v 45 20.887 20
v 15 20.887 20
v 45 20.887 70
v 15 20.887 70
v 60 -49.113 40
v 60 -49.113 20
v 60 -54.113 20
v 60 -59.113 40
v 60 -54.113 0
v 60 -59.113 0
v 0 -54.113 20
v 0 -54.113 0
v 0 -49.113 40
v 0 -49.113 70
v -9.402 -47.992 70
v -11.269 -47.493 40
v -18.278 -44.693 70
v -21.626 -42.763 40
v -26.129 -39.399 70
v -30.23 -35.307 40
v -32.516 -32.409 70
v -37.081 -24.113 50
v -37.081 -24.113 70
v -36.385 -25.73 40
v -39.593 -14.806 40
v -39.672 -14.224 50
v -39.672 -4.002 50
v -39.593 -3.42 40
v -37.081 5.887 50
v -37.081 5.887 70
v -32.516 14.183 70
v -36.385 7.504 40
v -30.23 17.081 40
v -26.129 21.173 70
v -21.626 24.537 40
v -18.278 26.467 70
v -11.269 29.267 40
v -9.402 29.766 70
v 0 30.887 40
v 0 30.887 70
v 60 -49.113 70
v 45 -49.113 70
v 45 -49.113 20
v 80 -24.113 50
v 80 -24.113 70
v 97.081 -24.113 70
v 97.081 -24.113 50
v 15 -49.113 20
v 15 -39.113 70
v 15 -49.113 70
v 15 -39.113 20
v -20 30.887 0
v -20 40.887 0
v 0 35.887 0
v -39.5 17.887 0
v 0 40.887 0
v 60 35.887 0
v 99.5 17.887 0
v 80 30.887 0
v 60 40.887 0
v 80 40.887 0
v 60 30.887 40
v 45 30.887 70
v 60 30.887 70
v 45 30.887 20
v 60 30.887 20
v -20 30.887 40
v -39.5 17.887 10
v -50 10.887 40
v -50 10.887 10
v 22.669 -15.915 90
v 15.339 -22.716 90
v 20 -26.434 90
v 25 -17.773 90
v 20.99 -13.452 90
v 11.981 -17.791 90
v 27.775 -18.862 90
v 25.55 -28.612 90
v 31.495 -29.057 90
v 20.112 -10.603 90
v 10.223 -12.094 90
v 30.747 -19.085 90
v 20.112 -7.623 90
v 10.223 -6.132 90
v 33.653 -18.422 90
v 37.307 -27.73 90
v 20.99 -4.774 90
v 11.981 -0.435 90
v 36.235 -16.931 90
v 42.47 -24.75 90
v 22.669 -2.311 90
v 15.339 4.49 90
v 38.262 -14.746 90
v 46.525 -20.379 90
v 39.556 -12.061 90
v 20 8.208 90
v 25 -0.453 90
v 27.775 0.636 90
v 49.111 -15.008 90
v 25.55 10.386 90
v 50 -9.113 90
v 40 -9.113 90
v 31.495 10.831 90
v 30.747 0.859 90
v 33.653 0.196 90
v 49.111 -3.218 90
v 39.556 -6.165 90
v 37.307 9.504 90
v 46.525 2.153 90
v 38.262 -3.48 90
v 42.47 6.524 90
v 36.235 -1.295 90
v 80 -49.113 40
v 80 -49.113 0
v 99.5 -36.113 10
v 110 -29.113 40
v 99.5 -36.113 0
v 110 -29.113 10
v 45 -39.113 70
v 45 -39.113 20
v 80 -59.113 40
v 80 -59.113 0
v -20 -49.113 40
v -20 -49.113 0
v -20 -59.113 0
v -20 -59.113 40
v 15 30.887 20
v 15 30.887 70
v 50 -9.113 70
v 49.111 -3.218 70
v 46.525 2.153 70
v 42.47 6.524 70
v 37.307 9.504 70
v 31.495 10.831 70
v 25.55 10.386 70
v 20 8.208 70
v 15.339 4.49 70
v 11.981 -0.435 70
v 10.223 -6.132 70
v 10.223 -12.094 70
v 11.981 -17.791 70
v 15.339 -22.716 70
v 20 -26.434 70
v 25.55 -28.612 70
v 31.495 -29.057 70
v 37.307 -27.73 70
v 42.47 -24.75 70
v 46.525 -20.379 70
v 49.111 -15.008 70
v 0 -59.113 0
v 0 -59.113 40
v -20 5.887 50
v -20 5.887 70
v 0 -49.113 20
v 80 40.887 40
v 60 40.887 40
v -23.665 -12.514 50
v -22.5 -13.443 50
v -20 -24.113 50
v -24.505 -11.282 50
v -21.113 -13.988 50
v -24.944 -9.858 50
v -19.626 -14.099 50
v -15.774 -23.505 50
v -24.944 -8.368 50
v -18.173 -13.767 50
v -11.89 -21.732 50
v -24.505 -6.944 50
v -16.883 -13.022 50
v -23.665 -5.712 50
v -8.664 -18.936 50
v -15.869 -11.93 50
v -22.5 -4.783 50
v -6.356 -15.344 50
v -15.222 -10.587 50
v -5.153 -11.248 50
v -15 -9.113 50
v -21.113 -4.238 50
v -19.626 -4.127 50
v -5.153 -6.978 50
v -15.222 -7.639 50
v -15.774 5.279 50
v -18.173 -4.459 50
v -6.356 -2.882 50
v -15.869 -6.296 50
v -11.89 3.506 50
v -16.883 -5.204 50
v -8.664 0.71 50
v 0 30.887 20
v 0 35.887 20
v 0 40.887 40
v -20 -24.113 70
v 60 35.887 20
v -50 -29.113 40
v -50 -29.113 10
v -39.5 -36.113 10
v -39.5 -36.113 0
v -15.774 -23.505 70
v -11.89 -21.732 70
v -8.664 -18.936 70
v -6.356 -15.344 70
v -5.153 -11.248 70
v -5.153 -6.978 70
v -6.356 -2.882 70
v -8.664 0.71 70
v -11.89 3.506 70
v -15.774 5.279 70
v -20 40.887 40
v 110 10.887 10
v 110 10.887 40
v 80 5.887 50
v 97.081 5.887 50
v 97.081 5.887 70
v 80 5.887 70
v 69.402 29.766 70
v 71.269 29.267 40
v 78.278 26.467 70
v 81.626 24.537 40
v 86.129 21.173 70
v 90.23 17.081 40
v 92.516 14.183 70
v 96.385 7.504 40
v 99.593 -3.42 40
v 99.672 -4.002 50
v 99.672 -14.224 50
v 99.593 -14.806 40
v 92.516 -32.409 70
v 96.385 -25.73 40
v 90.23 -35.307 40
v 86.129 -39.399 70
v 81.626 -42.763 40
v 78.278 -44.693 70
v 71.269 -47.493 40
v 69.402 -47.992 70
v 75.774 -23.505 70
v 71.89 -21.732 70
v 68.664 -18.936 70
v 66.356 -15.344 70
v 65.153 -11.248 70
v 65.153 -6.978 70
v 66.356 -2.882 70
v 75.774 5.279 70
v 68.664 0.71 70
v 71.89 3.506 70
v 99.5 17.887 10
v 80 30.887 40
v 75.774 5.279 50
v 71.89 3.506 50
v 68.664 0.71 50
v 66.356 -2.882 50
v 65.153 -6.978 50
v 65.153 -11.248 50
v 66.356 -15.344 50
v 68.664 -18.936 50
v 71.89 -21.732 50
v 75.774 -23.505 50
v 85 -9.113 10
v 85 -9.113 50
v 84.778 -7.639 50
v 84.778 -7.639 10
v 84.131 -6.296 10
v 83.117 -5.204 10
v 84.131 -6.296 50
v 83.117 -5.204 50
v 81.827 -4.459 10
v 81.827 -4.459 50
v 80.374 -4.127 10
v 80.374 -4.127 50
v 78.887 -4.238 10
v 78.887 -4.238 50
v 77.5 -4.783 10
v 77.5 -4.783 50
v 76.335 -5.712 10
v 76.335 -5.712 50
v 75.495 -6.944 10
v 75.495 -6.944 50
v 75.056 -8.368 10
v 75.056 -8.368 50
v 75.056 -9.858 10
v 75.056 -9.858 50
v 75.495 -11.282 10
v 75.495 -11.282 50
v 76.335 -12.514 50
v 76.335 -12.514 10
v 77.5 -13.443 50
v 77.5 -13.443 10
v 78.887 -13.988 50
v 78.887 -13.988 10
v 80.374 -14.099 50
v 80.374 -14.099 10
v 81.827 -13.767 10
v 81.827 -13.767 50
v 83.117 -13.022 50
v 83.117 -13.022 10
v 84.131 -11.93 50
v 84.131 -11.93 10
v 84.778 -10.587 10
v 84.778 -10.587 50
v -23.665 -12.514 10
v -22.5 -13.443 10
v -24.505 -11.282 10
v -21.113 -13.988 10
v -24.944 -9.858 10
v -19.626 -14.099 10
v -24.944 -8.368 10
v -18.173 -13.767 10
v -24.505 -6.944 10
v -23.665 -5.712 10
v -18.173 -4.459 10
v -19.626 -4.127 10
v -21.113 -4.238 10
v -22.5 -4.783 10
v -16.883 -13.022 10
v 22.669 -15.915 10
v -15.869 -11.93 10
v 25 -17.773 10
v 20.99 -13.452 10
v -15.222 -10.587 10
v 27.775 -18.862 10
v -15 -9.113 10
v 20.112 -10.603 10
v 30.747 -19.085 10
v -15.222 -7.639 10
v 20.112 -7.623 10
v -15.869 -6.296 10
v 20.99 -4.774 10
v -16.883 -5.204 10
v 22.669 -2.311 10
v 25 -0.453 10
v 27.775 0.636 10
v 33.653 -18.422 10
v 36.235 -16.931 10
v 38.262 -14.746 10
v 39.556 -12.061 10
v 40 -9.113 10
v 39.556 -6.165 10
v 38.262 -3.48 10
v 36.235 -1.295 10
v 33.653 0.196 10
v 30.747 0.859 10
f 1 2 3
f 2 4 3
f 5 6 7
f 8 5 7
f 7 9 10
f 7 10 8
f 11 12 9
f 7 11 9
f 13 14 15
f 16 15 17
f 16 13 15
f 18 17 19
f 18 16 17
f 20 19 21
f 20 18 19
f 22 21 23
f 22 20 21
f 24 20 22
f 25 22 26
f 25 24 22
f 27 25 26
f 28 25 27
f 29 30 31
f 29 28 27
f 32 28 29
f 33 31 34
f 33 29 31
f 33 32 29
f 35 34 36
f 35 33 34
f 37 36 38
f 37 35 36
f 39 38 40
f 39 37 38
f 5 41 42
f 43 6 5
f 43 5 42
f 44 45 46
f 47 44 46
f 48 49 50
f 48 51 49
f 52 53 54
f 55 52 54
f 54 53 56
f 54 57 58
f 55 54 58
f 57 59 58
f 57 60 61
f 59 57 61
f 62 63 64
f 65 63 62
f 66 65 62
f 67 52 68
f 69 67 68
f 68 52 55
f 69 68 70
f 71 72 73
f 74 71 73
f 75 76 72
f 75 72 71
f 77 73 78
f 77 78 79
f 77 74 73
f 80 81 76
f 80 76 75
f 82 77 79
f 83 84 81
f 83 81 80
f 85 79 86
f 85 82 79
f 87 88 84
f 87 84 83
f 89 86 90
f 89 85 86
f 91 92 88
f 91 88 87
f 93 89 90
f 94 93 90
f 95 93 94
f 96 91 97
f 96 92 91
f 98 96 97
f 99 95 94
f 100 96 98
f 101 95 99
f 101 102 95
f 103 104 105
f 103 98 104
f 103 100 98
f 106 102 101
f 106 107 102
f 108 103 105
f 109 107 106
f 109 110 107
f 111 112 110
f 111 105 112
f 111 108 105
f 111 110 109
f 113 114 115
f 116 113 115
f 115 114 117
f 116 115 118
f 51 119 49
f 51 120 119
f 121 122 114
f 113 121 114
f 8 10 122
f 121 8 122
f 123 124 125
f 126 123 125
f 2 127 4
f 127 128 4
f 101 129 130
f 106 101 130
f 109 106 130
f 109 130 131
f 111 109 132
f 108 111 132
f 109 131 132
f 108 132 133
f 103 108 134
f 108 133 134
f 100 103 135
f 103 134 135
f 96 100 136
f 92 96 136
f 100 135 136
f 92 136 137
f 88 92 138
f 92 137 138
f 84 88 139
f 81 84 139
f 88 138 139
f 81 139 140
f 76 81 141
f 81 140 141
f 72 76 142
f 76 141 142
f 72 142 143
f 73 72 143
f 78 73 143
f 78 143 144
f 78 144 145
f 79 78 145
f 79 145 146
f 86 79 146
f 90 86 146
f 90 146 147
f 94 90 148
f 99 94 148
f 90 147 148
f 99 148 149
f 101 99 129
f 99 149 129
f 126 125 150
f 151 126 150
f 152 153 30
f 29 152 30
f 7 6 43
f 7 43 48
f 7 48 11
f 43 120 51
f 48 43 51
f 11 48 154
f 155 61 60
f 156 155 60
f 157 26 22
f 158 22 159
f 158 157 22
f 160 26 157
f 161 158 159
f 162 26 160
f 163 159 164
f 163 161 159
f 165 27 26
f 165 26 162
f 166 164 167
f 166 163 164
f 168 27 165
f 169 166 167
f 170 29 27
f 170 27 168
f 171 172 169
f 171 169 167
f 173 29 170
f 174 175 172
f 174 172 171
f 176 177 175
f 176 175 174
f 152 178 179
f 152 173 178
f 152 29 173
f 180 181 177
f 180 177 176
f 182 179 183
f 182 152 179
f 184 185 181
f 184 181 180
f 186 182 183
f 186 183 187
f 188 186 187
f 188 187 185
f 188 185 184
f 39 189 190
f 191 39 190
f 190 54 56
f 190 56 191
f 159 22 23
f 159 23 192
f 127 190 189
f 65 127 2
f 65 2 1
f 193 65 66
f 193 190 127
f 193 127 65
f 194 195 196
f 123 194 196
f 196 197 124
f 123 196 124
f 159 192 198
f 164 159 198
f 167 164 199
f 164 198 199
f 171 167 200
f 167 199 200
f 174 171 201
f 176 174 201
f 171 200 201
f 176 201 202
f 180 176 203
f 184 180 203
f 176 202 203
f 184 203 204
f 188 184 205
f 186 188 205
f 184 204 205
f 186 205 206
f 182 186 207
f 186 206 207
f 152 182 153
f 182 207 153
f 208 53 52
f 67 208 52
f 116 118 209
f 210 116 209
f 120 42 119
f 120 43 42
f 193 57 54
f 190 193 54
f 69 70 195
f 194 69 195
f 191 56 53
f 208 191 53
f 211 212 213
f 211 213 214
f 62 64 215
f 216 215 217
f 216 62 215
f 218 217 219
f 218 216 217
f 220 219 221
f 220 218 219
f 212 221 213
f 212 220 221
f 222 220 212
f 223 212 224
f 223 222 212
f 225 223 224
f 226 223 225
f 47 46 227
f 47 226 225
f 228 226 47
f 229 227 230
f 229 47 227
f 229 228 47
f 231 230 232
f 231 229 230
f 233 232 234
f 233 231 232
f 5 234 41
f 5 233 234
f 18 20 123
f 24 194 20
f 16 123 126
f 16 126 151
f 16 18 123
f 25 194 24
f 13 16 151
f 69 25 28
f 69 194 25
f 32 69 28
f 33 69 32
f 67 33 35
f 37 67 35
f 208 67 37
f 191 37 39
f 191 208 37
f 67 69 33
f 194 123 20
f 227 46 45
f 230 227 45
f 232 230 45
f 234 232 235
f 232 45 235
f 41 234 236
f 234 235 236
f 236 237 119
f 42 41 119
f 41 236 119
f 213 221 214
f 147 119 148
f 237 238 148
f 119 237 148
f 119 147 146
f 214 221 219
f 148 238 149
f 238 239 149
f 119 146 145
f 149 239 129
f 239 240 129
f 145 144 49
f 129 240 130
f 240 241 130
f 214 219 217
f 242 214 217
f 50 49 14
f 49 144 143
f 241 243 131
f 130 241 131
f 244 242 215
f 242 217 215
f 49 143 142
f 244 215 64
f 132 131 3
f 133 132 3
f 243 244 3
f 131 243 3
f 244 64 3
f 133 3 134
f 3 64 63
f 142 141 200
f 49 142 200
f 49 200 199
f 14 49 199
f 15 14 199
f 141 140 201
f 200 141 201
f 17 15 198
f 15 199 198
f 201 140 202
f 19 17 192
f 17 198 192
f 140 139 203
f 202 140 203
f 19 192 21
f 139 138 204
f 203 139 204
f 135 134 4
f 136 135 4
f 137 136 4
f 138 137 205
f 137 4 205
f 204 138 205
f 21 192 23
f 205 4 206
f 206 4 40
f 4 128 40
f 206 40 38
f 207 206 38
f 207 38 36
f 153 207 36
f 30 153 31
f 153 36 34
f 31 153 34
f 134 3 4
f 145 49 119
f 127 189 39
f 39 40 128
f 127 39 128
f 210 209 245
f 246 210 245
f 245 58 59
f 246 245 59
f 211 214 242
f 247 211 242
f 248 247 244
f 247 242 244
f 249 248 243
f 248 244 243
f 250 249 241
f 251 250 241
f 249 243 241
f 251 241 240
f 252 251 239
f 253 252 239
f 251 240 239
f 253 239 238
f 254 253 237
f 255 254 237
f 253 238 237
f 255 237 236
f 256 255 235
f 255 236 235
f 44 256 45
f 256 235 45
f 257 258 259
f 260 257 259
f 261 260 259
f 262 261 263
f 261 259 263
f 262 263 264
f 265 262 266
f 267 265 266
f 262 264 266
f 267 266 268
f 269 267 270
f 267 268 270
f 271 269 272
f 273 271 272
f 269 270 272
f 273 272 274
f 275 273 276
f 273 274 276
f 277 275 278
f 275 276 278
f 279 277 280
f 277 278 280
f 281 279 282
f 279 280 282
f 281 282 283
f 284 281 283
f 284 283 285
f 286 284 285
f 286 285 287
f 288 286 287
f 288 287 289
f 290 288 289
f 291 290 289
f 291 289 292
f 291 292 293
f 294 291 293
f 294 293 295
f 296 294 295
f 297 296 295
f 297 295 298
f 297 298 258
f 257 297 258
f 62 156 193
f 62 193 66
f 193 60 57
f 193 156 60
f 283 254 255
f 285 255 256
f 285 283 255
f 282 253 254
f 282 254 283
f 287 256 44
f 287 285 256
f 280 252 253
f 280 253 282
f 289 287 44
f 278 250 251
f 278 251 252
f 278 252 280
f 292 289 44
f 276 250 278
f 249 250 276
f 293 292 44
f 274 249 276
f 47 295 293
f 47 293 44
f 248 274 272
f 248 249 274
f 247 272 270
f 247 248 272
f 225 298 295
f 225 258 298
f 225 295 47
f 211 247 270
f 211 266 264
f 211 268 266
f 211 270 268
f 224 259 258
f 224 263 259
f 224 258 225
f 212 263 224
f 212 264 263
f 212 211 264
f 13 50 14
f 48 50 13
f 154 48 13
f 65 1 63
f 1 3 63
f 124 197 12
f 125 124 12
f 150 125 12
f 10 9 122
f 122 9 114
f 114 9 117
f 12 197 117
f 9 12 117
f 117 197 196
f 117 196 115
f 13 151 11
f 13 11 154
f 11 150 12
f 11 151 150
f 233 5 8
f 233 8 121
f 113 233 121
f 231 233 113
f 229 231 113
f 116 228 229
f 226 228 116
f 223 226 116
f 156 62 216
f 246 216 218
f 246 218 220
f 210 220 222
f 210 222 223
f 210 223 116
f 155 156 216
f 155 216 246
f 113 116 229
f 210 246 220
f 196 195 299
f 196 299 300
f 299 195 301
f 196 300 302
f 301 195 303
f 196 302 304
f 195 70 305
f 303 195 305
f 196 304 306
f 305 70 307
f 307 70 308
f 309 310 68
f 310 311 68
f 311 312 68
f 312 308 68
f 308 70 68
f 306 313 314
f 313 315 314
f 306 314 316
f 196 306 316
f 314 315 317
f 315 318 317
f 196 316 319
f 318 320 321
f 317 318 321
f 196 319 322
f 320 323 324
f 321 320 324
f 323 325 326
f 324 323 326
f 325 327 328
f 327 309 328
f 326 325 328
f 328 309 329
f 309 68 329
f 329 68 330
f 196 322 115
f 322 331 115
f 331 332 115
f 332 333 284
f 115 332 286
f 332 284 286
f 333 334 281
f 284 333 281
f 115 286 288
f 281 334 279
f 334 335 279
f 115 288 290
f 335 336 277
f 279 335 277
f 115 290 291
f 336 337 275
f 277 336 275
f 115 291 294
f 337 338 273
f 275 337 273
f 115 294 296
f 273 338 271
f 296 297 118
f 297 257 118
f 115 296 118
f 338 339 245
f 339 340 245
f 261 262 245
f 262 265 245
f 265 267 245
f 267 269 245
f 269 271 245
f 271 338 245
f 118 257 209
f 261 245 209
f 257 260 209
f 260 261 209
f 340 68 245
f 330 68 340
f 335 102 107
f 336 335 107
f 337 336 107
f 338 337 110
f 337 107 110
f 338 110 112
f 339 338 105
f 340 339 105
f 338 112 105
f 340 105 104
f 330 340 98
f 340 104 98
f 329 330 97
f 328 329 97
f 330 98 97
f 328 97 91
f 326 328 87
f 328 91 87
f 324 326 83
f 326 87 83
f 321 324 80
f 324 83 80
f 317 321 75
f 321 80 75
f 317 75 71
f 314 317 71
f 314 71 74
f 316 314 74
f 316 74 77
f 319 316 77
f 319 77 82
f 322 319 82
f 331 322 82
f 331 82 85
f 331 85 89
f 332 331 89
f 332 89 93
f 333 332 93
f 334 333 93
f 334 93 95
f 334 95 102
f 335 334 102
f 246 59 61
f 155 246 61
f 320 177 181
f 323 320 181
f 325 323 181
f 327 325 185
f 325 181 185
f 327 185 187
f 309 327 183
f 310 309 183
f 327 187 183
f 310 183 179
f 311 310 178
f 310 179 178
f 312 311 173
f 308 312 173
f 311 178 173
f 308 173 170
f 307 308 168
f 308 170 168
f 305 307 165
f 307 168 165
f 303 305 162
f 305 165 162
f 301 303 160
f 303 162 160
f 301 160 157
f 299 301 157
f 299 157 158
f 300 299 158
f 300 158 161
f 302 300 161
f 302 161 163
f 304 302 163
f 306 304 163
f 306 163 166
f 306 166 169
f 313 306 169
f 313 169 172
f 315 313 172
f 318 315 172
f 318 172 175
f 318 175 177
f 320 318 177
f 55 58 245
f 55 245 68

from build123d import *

# Parameters (mm, degrees)
BOSS_EXTRUDE1_DEPTH = 40
BOSS_EXTRUDE2_DEPTH = 30
SKETCH3_R           = 20
BOSS_EXTRUDE3_DEPTH = 20
SKETCH4_R           = 10
CUT_EXTRUDE1_DEPTH  = 185
SKETCH5_R           = 5
CUT_EXTRUDE2_DEPTH  = 185
SKETCH6_R           = 5
CUT_EXTRUDE3_DEPTH  = 20
CUT_EXTRUDE4_DEPTH  = 20
CUT_EXTRUDE5_DEPTH  = 20
CUT_EXTRUDE7_DEPTH  = 10


with BuildPart() as part:
    # Sketch1 → Boss-Extrude1 (new body)
    with BuildSketch(Plane.XY):
        Polygon((0, 40.88699749), (-20, 40.88699749), (-20, 30.88699749), (-50, 10.88699749), (-50, -29.11300251), (-20, -49.11300251), (-20, -59.11300251), (0, -59.11300251), (0, -54.11300251), (60, -54.11300251), (60, -59.11300251), (80, -59.11300251), (80, -49.11300251), (110, -29.11300251), (110, 10.88699749), (80, 30.88699749), (80, 40.88699749), (60, 40.88699749), (60, 35.88699749), (0, 35.88699749), align=None)
    extrude(amount=BOSS_EXTRUDE1_DEPTH)

    # Sketch2 → Boss-Extrude2 (add)
    with BuildSketch(Plane.XY.offset(40)):
        with BuildLine():
            Line((0, 30.88699749), (15, 30.88699749))
            Line((15, 30.88699749), (15, 20.88699749))
            Line((15, 20.88699749), (45, 20.88699749))
            Line((45, 20.88699749), (45, 30.88699749))
            Line((45, 30.88699749), (60, 30.88699749))
            ThreePointArc((60, 30.88699749), (100, -9.11300251), (60, -49.11300251))
            Line((60, -49.11300251), (45, -49.11300251))
            Line((45, -49.11300251), (45, -39.11300251))
            Line((45, -39.11300251), (15, -39.11300251))
            Line((15, -39.11300251), (15, -49.11300251))
            Line((15, -49.11300251), (0, -49.11300251))
            ThreePointArc((0, -49.11300251), (-40, -9.11300251), (0, 30.88699749))
        make_face()
    extrude(amount=BOSS_EXTRUDE2_DEPTH)

    # Sketch3 → Boss-Extrude3 (add)
    with BuildSketch(Plane.XY.offset(70)):
        with Locations((30, -9.11300251)):
            Circle(SKETCH3_R)
    extrude(amount=BOSS_EXTRUDE3_DEPTH)

    # Sketch4 → Cut-Extrude1 (cut)
    with BuildSketch(Plane.XY.offset(90)):
        with Locations((30, -9.11300251)):
            Circle(SKETCH4_R)
    extrude(amount=-CUT_EXTRUDE1_DEPTH, mode=Mode.SUBTRACT)

    # Sketch5 → Cut-Extrude2 (cut)
    with BuildSketch(Plane.XY.offset(70)):
        with Locations((-20, -9.11300251)):
            Circle(SKETCH5_R)
        with Locations((80, -9.11300251)):
            Circle(SKETCH5_R)
    extrude(amount=-CUT_EXTRUDE2_DEPTH, mode=Mode.SUBTRACT)

    # Sketch6 → Cut-Extrude3 (cut)
    with BuildSketch(Plane.XY.offset(70)):
        with BuildLine():
            ThreePointArc((-20, -24.11300251), (-5, -9.11300251), (-20, 5.88699749))
            Line((-20, 5.88699749), (-37.080992435, 5.88699749))
            ThreePointArc((-37.080992435, 5.88699749), (-40, -9.11300251), (-37.080992435, -24.11300251))
            Line((-37.080992435, -24.11300251), (-20, -24.11300251))
        make_face()
        with Locations((-20, -9.11300251)):
            Circle(SKETCH6_R, mode=Mode.SUBTRACT)
        with BuildLine():
            Line((97.080992435, 5.88699749), (80, 5.88699749))
            ThreePointArc((80, 5.88699749), (65, -9.11300251), (80, -24.11300251))
            Line((80, -24.11300251), (97.080992435, -24.11300251))
            ThreePointArc((97.080992435, -24.11300251), (100, -9.11300251), (97.080992435, 5.88699749))
        make_face()
        with Locations((80, -9.11300251)):
            Circle(SKETCH6_R, mode=Mode.SUBTRACT)
    extrude(amount=-CUT_EXTRUDE3_DEPTH, mode=Mode.SUBTRACT)

    # Sketch7 → Cut-Extrude4 (cut)
    with BuildSketch(Plane.XY.offset(40)):
        Polygon((0, 35.88699749), (0, 30.88699749), (15, 30.88699749), (15, 20.88699749), (45, 20.88699749), (45, 30.88699749), (60, 30.88699749), (60, 35.88699749), align=None)
    extrude(amount=-CUT_EXTRUDE4_DEPTH, mode=Mode.SUBTRACT)

    # Sketch8 → Cut-Extrude5 (cut)
    with BuildSketch(Plane.XY.offset(40)):
        Polygon((0, -54.11300251), (0, -49.11300251), (15, -49.11300251), (15, -39.11300251), (45, -39.11300251), (45, -49.11300251), (60, -49.11300251), (60, -54.11300251), align=None)
    extrude(amount=-CUT_EXTRUDE5_DEPTH, mode=Mode.SUBTRACT)

    # Sketch9 → Cut-Extrude7 (cut)
    with BuildSketch(Plane(origin=(0, 0, 0), x_dir=(-1, 0, 0), z_dir=(0, 0, -1))):
        Polygon((-99.5, 17.88699749), (39.5, 17.88699749), (50, 10.88699749), (50, -29.11300251), (39.5, -36.11300251), (-99.5, -36.11300251), (-110, -29.11300251), (-110, 10.88699749), align=None)
    extrude(amount=-CUT_EXTRUDE7_DEPTH, mode=Mode.SUBTRACT)


solid = part.part
